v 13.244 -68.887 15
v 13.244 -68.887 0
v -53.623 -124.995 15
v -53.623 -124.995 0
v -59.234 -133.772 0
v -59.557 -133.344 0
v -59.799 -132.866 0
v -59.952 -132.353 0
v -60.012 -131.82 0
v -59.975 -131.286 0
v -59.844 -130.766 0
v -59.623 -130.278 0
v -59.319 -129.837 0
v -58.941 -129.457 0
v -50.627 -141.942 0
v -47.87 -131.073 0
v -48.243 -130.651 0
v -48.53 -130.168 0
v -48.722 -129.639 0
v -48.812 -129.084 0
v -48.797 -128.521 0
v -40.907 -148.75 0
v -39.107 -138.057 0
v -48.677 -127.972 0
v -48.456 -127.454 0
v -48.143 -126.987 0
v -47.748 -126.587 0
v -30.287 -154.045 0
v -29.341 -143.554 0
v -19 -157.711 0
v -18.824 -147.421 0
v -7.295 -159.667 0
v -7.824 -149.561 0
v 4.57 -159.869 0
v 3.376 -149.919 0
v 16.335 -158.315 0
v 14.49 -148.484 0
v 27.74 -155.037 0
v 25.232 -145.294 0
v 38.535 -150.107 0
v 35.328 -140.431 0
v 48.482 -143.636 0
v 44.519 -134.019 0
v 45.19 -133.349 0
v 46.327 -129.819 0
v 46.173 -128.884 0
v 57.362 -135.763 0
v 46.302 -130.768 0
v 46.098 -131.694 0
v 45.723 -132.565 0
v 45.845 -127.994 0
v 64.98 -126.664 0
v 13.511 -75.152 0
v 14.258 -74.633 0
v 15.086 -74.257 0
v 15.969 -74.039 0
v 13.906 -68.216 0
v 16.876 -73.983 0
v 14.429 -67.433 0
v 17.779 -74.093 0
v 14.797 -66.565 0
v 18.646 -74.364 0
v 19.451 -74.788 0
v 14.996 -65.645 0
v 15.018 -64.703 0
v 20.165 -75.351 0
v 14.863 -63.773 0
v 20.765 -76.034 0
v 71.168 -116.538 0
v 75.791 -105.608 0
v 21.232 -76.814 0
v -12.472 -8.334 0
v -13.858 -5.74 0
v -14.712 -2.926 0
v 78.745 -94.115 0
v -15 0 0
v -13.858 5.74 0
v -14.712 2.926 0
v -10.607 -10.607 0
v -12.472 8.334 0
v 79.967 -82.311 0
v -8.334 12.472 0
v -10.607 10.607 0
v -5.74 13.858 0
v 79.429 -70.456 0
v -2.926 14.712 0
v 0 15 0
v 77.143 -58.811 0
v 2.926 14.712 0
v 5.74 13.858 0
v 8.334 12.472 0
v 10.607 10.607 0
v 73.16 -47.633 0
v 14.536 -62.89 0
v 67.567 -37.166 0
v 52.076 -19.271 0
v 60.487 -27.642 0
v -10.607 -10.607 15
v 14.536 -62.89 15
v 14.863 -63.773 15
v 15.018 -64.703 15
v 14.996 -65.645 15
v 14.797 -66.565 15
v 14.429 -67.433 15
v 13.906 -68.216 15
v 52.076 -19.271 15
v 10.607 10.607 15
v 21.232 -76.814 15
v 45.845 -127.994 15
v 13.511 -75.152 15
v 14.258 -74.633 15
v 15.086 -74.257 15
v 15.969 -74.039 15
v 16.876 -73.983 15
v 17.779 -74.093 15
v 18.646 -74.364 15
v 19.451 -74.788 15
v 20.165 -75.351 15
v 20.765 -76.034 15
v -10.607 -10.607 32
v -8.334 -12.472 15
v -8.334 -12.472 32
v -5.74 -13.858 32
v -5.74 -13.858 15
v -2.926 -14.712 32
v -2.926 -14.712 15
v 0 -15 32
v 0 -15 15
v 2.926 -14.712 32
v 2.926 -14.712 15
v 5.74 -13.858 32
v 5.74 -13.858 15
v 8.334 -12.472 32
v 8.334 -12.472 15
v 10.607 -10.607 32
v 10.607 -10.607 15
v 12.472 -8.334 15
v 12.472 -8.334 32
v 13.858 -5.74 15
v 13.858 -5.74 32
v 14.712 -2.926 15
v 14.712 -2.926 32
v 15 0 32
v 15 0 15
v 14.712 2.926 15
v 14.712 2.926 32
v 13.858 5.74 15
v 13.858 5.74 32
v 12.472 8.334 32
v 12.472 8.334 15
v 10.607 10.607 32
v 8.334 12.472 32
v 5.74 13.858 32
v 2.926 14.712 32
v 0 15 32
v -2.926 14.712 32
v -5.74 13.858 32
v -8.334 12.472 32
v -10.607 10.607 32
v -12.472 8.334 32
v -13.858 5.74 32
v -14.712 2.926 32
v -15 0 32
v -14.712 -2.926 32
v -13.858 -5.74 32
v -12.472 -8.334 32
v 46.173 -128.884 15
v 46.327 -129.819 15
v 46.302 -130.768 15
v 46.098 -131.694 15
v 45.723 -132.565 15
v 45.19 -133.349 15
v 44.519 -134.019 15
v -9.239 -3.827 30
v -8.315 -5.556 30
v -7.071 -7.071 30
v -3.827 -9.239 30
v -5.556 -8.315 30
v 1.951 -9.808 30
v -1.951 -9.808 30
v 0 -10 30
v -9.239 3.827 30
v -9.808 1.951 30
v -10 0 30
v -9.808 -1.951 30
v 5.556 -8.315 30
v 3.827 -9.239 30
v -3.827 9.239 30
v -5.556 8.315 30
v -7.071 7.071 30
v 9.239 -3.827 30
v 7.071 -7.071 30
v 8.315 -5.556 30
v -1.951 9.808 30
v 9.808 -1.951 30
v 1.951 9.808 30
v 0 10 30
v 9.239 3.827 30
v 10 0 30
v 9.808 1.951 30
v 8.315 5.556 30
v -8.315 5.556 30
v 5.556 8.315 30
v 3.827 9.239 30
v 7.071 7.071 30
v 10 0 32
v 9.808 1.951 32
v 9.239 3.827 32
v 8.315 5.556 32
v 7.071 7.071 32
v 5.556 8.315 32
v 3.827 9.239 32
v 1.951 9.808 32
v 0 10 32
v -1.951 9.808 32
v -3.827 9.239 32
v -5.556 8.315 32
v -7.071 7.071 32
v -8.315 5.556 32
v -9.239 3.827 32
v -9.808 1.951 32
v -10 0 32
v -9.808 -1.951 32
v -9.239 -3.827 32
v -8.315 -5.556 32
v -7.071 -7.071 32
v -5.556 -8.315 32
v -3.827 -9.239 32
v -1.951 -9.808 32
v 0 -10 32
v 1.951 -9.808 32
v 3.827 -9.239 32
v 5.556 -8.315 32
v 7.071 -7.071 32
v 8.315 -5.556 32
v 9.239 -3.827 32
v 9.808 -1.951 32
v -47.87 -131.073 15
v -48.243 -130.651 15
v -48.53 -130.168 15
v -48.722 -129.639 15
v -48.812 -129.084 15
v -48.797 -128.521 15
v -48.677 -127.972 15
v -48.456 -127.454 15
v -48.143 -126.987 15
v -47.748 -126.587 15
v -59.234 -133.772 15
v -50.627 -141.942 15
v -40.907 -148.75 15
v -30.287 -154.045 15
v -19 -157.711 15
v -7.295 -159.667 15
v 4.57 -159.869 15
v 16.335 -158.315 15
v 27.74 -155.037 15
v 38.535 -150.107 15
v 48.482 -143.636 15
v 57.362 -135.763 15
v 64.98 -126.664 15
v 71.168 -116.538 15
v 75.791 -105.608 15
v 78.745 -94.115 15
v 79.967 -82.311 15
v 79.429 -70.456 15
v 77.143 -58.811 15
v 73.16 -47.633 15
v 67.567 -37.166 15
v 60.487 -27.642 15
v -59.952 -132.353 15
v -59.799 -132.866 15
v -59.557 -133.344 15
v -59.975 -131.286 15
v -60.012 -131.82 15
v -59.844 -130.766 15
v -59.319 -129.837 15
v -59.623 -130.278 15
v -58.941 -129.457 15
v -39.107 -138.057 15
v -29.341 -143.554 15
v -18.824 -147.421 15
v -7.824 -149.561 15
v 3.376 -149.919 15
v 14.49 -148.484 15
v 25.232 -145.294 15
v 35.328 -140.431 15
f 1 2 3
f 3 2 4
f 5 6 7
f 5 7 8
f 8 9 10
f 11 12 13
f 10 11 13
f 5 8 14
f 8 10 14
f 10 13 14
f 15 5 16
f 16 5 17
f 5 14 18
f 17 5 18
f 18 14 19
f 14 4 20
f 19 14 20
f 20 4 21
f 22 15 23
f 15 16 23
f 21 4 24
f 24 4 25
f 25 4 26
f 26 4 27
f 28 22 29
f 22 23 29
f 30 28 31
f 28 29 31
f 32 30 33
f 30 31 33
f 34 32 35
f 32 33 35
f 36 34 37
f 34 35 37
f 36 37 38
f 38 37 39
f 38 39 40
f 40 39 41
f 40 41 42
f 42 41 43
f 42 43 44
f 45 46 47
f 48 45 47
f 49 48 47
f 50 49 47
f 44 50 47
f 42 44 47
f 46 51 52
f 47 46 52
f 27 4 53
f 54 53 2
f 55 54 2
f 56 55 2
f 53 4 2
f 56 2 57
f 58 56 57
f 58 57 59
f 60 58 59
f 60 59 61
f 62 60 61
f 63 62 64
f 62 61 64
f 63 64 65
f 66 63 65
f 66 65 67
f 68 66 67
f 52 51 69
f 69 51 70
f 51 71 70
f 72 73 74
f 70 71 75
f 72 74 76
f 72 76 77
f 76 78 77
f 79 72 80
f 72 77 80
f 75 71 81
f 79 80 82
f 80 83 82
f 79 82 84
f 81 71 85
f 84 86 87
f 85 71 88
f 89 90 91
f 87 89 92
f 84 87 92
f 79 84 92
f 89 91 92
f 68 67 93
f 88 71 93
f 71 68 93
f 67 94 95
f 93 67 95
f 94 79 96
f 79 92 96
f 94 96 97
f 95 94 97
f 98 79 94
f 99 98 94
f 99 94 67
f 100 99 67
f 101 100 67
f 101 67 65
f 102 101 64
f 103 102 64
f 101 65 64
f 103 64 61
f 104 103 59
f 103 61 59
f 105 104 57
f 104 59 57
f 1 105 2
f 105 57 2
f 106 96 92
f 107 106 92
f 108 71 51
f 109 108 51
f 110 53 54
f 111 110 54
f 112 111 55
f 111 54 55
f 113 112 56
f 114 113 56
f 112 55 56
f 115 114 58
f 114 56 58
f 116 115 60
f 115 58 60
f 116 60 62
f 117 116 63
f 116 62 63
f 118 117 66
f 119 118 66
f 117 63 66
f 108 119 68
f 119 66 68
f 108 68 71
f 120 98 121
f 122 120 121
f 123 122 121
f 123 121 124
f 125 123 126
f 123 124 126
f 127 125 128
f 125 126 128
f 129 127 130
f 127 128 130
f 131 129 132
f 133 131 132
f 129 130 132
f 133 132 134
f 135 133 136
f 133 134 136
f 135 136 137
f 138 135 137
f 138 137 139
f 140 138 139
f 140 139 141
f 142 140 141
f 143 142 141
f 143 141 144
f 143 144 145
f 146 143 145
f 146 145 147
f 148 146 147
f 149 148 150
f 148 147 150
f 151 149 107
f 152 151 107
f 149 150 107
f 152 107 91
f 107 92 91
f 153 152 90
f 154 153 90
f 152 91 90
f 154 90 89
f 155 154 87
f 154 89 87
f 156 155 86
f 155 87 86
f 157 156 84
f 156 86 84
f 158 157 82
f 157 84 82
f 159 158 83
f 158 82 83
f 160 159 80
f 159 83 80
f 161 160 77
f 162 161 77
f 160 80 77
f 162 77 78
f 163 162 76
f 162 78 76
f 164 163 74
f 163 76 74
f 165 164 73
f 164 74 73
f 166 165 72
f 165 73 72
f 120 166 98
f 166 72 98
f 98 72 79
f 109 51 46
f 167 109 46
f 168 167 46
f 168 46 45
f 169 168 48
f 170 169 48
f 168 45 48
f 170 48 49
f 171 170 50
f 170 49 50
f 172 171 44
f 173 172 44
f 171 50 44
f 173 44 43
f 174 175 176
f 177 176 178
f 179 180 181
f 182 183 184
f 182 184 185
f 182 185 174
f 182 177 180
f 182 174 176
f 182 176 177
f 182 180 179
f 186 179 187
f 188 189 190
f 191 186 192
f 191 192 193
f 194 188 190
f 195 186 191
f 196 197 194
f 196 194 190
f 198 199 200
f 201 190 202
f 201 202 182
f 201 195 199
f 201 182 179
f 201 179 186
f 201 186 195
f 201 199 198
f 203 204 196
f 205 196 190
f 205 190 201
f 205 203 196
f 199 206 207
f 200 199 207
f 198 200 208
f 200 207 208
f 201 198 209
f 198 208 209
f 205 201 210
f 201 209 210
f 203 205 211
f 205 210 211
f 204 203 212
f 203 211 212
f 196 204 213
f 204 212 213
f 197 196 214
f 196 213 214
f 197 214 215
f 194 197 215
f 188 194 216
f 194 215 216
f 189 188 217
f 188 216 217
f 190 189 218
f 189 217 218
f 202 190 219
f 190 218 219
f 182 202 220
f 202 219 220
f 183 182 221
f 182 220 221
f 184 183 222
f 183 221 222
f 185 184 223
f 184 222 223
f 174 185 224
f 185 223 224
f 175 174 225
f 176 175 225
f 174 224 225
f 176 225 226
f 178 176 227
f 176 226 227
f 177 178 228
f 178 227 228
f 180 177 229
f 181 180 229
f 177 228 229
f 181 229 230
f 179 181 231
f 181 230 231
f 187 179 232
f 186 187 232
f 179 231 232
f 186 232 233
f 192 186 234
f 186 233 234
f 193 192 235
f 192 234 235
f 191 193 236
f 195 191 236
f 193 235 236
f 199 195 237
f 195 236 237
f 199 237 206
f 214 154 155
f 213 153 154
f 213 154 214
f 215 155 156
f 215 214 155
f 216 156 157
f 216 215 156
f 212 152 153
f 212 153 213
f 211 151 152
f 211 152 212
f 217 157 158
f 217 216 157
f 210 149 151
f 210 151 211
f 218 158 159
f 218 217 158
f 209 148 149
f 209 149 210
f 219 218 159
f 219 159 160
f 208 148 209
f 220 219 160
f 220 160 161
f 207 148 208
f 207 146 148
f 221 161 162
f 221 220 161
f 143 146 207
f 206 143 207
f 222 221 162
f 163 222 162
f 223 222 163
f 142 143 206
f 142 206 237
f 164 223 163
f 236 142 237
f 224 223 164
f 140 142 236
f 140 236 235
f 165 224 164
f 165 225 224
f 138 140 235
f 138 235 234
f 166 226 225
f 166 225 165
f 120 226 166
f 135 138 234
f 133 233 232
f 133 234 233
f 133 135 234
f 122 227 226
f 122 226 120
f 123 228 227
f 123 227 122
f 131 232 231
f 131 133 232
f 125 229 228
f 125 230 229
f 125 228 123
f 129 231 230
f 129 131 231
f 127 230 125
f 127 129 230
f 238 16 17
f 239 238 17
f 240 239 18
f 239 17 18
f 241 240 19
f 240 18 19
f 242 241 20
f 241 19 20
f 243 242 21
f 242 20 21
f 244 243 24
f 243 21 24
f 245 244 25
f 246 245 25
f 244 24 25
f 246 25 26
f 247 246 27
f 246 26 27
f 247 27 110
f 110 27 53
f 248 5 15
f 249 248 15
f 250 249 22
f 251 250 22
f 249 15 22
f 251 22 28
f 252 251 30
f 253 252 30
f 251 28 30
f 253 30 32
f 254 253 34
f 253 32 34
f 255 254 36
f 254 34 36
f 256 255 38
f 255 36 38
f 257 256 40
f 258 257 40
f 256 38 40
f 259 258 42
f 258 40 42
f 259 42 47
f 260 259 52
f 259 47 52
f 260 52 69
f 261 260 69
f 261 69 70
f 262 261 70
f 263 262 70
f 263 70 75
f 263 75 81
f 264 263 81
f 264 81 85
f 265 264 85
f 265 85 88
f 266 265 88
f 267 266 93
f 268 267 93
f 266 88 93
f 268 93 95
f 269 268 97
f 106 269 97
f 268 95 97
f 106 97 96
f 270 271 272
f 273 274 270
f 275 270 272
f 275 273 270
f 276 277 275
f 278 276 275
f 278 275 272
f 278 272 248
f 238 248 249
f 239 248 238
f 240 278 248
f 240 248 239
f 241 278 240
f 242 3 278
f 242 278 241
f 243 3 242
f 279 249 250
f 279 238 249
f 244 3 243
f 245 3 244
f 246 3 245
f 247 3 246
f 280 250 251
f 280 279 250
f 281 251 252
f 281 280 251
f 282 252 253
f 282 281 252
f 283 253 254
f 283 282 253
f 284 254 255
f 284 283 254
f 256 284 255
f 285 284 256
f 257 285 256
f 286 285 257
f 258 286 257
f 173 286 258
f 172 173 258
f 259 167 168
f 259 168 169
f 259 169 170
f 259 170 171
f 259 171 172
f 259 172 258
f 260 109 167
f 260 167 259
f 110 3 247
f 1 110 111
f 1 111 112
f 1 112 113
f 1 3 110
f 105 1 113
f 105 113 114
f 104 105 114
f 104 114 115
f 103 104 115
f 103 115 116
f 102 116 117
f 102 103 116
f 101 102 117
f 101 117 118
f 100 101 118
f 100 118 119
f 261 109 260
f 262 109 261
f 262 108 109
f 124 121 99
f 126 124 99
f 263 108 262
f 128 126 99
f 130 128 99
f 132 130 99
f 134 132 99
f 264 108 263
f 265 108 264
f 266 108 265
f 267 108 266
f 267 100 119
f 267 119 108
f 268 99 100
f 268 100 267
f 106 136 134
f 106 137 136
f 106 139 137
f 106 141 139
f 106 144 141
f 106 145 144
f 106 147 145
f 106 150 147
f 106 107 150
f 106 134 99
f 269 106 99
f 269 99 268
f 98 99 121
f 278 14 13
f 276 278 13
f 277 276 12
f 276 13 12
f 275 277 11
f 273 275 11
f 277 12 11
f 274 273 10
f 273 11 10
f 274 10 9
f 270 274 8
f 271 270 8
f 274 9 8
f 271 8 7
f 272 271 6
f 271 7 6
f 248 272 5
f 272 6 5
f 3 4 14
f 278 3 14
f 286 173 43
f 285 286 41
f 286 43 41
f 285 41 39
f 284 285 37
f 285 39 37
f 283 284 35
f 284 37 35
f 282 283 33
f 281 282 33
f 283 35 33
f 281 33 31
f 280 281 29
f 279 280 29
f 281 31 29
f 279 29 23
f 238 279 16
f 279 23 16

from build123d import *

# Parameters (mm, degrees)
EXTRUDE_1_DEPTH     = 15
SKETCH_5_R          = 15
EXTRUDE_2_DEPTH     = 17
SKETCH_7_R          = 10
CUT_EXTRUDE_1_DEPTH = 2


with BuildPart() as part:
    # ｽｹｯﾁ4 → ﾎﾞｽ - 押し出し1 (new body)
    with BuildSketch(Plane.XY):
        with BuildLine():
            Line((-53.623111018, -124.995132678), (-58.940636287, -129.45706617))
            ThreePointArc((-58.940636287, -129.45706617), (-60.005384698, -131.552012131), (-59.233530865, -133.771635843))
            ThreePointArc((-59.233530865, -133.771635843), (57.362306223, -135.763481103), (52.076178918, -19.270504783))
            Line((52.076178918, -19.270504783), (10.606601718, 10.606601718))
            ThreePointArc((10.606601718, 10.606601718), (-10.606601718, 10.606601718), (-10.606601718, -10.606601718))
            Line((-10.606601718, -10.606601718), (14.536280154, -62.889638219))
            ThreePointArc((14.536280154, -62.889638219), (14.918089499, -66.109676181), (13.244185189, -68.886809092))
            Line((13.244185189, -68.886809092), (-53.623111018, -124.995132678))
        make_face()
        with BuildLine():
            Line((21.232400696, -76.813798404), (45.844843506, -127.993820346))
            ThreePointArc((45.844843506, -127.993820346), (46.221944165, -131.235480845), (44.518718993, -134.019289696))
            ThreePointArc((44.518718993, -134.019289696), (-2.231208213, -149.964431749), (-47.870174388, -131.072951785))
            ThreePointArc((-47.870174388, -131.072951785), (-48.817477846, -128.802229421), (-47.747678417, -126.586582094))
            Line((-47.747678417, -126.586582094), (13.511229465, -75.151532228))
            ThreePointArc((13.511229465, -75.151532228), (17.77869109, -74.092739753), (21.232400696, -76.813798404))
        make_face(mode=Mode.SUBTRACT)
    extrude(amount=EXTRUDE_1_DEPTH)

    # ｽｹｯﾁ5 → ﾎﾞｽ - 押し出し2 (add)
    with BuildSketch(Plane.XY.offset(15)):
        with Locations(Location((0, 0, 0), (0, 0, 225))):
            Circle(SKETCH_5_R)
    extrude(amount=EXTRUDE_2_DEPTH)

    # ｽｹｯﾁ7 → ｶｯﾄ - 押し出し1 (cut)
    with BuildSketch(Plane.XY.offset(32)):
        Circle(SKETCH_7_R)
    extrude(amount=-CUT_EXTRUDE_1_DEPTH, mode=Mode.SUBTRACT)


solid = part.part
